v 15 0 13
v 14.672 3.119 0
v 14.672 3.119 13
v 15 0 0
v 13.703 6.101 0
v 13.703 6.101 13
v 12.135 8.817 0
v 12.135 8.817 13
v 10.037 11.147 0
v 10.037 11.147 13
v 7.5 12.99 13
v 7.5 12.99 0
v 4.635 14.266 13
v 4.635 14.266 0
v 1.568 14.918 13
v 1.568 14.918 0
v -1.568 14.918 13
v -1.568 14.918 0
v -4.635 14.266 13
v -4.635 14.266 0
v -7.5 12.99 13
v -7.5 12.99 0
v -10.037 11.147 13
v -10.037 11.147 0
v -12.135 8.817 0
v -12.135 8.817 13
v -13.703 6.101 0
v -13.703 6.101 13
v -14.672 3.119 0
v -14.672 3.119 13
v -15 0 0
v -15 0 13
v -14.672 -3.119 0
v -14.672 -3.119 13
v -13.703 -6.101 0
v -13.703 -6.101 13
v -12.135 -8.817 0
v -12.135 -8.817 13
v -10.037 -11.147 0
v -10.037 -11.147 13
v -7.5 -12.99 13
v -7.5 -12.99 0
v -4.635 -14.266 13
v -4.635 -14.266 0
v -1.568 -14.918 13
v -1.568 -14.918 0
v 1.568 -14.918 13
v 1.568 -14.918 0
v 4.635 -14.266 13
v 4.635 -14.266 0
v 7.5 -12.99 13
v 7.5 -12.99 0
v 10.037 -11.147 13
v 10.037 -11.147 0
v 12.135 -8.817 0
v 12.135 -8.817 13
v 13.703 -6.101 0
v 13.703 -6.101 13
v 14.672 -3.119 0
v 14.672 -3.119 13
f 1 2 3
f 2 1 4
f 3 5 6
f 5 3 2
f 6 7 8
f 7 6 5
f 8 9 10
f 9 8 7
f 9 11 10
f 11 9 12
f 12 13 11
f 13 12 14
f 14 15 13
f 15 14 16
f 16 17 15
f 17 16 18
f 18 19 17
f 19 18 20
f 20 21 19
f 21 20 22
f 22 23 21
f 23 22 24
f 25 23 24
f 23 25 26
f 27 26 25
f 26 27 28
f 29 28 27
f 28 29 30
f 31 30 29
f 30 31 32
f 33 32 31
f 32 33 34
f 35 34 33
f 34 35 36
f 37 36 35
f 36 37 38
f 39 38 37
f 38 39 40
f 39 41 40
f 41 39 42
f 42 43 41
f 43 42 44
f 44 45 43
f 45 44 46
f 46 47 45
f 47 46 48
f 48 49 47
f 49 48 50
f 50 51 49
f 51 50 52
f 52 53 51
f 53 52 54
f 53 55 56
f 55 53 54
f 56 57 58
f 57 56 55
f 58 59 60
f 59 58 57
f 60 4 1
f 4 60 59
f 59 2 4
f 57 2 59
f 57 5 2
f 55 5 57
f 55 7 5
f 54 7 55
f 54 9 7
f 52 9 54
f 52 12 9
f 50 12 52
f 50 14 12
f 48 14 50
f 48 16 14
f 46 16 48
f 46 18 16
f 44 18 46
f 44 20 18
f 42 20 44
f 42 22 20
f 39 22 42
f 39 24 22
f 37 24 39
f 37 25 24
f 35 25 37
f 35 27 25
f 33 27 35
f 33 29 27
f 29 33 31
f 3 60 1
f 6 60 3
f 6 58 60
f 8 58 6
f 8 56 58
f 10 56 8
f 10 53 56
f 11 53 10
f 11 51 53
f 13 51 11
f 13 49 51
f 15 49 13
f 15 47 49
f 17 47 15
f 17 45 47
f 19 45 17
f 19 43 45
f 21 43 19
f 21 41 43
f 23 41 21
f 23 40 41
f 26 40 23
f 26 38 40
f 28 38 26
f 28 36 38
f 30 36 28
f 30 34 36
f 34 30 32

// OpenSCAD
// Generated by SolidPython 1.0.1 on 2020-07-29 00:46:44


cylinder(h = 13, r1 = 15, r2 = 15);
/***********************************************
*********      SolidPython code:      **********
************************************************
 
# import packages: SolidPython
from solid import *
from solid.utils import *
from itertools import chain, combinations, permutations


class Resize:

    def __init__(self, scad_file):
        self.scad_file = scad_file
        #self.scad_file = import_scad(scad_file)
        # cone/cylinder param:
        self.r1 = 0
        self.r2 = 0
        self.h = 0
        # rectangular prism param:
        self.w = 0
        self.l = 0
        # ellipse param:
        self.r = 0

    # import OpenScad code (file name corresponds to shape)


    # classify shape + parameters
    def assign(self, param1, param2, param3):
        if self.scad_file == 'cone.scad':
            self.r1 = param1
            self.r2 = param2
            self.h = param3
        elif self.scad_file == 'cylinder.scad':
            self.r1 = param1
            self.r2 = param2
            self.h = param3
        elif self.scad_file == 'rectangularPrism.scad':
            self.h = param1
            self.l = param2
            self.w = param3
        else:
            self.r = param1
            self.h = param2

    # resize parameters
    def iterate(self):
        x = range(3, 20, 2)
        i = 1
        if self.scad_file == 'cone.scad':
            tempList = list(permutations(x, 2))
            for temp in tempList:
                param1 = temp[0]
                param2 = temp[1]
                filepath = 'produced_scad_files/' + 'cone' + str(param1) + '_' + str(param2) + '_' + '.scad'
                scad_render_to_file(cylinder(h=param1, r1=param2, r2=0), filepath)

        elif self.scad_file == 'cylinder.scad':
            tempList = list(permutations(x, 3))
            for temp in tempList:
                param1 = temp[0]
                param2 = temp[1]
                filepath = 'produced_scad_files/' + 'cylinder' + str(param1) + '_' + str(param2) + '_' + '.scad'
                scad_render_to_file(cylinder(h=param1, r1=param2, r2=param2), filepath)

        elif self.scad_file == 'rectangularPrism.scad':
            tempList = list(permutations(x, 3))
            for temp in tempList:
                param1 = temp[0]
                param2 = temp[1]
                param3 = temp[2]
                filepath = 'produced_scad_files/' + 'rectangularPrism' + str(param1) + '_' + str(param2) + '_' + str(
                    param3) + '.scad'
                scad_render_to_file(cube(size=(param1, param2, param3)), filepath)

        elif self.scad_file == 'ellipse.scad':
            tempList = list(permutations(x, 4))
            for temp in tempList:
                param1 = temp[0]
                param2 = temp[1]
                param3 = temp[2]
                param4 = temp[3]
                filepath = 'produced_scad_files/' + 'ellipse' + str(param1) + '_' + str(param2) + '_' + str(param3) + '_' + str(param4) + '.scad'
                scad_render_to_file(scale([param1, param2, param3])(sphere(r=param4)), filepath)

    def render_to_scadfile(self):
        scad_render_to_file(scad, 'example.scad') 
 
************************************************/
